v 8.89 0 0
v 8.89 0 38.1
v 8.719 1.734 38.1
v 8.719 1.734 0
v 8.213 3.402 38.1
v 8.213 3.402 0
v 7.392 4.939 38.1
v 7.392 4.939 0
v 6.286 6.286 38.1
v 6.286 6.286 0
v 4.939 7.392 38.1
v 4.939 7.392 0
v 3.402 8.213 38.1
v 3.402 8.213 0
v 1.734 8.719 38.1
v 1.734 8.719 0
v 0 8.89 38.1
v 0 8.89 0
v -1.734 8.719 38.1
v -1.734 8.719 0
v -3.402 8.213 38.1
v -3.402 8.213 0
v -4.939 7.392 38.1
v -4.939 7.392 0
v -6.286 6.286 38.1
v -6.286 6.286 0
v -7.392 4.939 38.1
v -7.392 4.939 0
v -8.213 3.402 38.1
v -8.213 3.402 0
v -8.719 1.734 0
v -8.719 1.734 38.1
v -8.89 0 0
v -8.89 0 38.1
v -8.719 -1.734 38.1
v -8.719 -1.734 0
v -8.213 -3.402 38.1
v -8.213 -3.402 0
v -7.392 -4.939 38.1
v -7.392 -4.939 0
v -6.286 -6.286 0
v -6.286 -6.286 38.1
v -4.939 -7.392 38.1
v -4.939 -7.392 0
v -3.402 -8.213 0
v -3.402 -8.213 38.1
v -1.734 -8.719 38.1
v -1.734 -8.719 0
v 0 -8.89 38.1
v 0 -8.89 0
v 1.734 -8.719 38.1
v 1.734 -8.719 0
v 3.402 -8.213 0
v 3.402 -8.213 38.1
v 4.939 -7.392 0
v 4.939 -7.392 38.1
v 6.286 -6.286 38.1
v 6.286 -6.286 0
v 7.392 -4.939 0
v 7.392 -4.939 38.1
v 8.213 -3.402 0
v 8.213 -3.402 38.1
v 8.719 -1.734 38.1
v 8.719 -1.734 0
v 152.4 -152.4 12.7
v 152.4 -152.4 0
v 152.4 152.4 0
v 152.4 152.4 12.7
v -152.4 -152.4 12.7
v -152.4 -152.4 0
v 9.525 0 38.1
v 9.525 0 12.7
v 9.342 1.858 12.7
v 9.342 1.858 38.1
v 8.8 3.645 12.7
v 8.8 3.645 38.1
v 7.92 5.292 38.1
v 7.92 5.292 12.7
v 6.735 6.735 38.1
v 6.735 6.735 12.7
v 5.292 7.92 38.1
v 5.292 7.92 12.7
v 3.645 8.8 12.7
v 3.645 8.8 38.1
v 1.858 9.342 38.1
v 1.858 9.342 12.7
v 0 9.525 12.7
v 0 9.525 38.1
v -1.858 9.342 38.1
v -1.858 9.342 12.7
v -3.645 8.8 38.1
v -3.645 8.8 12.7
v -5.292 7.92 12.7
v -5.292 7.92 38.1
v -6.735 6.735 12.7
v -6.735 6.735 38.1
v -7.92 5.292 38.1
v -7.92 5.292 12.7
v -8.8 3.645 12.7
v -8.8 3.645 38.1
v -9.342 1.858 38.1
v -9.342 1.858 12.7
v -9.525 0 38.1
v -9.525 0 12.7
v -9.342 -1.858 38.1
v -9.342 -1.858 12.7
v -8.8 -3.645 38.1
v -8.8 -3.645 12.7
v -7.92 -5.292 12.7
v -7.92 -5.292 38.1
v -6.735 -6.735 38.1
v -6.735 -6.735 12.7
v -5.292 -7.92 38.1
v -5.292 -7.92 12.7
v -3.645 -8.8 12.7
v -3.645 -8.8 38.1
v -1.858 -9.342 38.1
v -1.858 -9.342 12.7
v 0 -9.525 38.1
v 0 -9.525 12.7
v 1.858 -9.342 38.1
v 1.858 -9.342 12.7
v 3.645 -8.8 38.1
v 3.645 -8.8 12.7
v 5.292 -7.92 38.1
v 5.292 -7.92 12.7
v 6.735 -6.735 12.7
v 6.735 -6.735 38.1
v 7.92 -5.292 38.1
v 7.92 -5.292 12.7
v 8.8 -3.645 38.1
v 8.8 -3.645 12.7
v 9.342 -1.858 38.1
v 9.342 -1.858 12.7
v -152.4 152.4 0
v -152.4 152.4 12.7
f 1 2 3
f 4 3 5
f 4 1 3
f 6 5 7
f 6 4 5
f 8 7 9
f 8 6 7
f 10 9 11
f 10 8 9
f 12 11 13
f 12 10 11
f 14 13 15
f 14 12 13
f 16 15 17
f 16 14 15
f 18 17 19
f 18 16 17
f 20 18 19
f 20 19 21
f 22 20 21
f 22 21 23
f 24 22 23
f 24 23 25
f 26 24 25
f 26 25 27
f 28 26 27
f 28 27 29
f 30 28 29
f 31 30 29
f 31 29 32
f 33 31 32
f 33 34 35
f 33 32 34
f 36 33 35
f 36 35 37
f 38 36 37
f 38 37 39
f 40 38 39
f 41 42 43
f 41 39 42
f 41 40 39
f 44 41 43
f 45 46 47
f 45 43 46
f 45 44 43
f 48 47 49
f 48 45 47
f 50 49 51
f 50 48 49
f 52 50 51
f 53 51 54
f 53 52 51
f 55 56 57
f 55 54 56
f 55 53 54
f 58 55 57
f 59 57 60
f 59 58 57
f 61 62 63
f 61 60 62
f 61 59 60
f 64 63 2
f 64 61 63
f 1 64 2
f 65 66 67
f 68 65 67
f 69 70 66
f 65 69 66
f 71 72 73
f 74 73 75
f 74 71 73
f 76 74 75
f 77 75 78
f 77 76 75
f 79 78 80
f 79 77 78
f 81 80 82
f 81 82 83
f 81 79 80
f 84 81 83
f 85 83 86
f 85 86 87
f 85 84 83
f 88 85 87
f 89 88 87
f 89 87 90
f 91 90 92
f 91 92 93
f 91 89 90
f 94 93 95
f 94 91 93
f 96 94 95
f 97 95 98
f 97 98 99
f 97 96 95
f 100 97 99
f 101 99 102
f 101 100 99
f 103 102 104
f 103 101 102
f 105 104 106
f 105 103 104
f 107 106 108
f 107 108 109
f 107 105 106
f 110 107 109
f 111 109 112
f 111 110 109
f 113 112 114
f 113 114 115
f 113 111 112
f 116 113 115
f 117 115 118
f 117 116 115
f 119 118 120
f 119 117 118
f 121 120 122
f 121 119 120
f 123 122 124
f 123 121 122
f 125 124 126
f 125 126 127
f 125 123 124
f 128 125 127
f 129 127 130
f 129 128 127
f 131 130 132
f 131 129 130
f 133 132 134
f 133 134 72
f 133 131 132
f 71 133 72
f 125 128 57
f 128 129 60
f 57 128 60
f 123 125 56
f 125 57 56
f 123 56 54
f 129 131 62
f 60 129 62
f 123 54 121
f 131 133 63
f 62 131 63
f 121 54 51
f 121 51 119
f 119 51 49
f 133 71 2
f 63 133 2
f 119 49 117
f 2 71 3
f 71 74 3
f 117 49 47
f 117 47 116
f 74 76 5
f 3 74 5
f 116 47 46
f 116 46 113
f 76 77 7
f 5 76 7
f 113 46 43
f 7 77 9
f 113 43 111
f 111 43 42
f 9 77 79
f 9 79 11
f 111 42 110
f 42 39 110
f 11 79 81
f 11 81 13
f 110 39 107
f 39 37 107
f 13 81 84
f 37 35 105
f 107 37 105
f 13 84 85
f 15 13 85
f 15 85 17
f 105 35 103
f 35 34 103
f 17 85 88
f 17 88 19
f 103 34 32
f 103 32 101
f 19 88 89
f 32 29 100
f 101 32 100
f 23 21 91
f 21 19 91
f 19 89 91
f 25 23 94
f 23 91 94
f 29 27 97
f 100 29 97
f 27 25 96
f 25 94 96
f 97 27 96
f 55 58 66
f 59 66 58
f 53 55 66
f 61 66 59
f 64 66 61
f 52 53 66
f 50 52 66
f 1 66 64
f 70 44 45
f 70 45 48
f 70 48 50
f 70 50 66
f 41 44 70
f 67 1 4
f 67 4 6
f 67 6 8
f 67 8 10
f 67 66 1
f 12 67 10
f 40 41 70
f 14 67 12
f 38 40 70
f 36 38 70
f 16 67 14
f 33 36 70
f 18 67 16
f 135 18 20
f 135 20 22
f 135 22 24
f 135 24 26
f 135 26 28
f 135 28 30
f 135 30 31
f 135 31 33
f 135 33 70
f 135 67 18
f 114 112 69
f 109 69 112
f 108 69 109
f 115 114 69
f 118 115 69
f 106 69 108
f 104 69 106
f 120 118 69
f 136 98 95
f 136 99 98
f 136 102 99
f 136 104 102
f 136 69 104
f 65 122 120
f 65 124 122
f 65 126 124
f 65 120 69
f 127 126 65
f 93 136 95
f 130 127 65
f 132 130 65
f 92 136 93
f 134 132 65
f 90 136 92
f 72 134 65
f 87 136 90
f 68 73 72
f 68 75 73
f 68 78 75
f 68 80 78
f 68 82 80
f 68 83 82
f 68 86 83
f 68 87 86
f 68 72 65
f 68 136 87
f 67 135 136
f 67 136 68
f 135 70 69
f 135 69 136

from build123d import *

# Parameters (mm, degrees)
F0_W     = 304.8
F0_H     = 304.8
F1_DEPTH = 12.7
F2_R     = 9.525
F3_DEPTH = 12.7
F4_W     = 9.525
F4_H     = 38.1
F6_R     = 8.89
F7_DEPTH = 38.101


with BuildPart() as f1:
    # F0 (on Top) → F1 (new body)
    with BuildSketch(Plane.XY):
        Rectangle(F0_W, F0_H)
    extrude(amount=F1_DEPTH)

    # F2 (on Top) → F3 (cut, symmetric)
    with BuildSketch(Plane.XY):
        Circle(F2_R)
    extrude(amount=F3_DEPTH, both=True, mode=Mode.SUBTRACT)

    # F4 (on Front) → F5 (revolve)
    with BuildSketch(Plane.XZ):
        with Locations((4.7625, 19.05)):
            Rectangle(F4_W, F4_H)
    revolve(axis=Axis((0, 0, 19.05), (0, 0, 1)))

    # F6 (on Top) → F7 (cut, through all)
    with BuildSketch(Plane.XY):
        Circle(F6_R)
    extrude(amount=F7_DEPTH, mode=Mode.SUBTRACT)


solid = f1.part
